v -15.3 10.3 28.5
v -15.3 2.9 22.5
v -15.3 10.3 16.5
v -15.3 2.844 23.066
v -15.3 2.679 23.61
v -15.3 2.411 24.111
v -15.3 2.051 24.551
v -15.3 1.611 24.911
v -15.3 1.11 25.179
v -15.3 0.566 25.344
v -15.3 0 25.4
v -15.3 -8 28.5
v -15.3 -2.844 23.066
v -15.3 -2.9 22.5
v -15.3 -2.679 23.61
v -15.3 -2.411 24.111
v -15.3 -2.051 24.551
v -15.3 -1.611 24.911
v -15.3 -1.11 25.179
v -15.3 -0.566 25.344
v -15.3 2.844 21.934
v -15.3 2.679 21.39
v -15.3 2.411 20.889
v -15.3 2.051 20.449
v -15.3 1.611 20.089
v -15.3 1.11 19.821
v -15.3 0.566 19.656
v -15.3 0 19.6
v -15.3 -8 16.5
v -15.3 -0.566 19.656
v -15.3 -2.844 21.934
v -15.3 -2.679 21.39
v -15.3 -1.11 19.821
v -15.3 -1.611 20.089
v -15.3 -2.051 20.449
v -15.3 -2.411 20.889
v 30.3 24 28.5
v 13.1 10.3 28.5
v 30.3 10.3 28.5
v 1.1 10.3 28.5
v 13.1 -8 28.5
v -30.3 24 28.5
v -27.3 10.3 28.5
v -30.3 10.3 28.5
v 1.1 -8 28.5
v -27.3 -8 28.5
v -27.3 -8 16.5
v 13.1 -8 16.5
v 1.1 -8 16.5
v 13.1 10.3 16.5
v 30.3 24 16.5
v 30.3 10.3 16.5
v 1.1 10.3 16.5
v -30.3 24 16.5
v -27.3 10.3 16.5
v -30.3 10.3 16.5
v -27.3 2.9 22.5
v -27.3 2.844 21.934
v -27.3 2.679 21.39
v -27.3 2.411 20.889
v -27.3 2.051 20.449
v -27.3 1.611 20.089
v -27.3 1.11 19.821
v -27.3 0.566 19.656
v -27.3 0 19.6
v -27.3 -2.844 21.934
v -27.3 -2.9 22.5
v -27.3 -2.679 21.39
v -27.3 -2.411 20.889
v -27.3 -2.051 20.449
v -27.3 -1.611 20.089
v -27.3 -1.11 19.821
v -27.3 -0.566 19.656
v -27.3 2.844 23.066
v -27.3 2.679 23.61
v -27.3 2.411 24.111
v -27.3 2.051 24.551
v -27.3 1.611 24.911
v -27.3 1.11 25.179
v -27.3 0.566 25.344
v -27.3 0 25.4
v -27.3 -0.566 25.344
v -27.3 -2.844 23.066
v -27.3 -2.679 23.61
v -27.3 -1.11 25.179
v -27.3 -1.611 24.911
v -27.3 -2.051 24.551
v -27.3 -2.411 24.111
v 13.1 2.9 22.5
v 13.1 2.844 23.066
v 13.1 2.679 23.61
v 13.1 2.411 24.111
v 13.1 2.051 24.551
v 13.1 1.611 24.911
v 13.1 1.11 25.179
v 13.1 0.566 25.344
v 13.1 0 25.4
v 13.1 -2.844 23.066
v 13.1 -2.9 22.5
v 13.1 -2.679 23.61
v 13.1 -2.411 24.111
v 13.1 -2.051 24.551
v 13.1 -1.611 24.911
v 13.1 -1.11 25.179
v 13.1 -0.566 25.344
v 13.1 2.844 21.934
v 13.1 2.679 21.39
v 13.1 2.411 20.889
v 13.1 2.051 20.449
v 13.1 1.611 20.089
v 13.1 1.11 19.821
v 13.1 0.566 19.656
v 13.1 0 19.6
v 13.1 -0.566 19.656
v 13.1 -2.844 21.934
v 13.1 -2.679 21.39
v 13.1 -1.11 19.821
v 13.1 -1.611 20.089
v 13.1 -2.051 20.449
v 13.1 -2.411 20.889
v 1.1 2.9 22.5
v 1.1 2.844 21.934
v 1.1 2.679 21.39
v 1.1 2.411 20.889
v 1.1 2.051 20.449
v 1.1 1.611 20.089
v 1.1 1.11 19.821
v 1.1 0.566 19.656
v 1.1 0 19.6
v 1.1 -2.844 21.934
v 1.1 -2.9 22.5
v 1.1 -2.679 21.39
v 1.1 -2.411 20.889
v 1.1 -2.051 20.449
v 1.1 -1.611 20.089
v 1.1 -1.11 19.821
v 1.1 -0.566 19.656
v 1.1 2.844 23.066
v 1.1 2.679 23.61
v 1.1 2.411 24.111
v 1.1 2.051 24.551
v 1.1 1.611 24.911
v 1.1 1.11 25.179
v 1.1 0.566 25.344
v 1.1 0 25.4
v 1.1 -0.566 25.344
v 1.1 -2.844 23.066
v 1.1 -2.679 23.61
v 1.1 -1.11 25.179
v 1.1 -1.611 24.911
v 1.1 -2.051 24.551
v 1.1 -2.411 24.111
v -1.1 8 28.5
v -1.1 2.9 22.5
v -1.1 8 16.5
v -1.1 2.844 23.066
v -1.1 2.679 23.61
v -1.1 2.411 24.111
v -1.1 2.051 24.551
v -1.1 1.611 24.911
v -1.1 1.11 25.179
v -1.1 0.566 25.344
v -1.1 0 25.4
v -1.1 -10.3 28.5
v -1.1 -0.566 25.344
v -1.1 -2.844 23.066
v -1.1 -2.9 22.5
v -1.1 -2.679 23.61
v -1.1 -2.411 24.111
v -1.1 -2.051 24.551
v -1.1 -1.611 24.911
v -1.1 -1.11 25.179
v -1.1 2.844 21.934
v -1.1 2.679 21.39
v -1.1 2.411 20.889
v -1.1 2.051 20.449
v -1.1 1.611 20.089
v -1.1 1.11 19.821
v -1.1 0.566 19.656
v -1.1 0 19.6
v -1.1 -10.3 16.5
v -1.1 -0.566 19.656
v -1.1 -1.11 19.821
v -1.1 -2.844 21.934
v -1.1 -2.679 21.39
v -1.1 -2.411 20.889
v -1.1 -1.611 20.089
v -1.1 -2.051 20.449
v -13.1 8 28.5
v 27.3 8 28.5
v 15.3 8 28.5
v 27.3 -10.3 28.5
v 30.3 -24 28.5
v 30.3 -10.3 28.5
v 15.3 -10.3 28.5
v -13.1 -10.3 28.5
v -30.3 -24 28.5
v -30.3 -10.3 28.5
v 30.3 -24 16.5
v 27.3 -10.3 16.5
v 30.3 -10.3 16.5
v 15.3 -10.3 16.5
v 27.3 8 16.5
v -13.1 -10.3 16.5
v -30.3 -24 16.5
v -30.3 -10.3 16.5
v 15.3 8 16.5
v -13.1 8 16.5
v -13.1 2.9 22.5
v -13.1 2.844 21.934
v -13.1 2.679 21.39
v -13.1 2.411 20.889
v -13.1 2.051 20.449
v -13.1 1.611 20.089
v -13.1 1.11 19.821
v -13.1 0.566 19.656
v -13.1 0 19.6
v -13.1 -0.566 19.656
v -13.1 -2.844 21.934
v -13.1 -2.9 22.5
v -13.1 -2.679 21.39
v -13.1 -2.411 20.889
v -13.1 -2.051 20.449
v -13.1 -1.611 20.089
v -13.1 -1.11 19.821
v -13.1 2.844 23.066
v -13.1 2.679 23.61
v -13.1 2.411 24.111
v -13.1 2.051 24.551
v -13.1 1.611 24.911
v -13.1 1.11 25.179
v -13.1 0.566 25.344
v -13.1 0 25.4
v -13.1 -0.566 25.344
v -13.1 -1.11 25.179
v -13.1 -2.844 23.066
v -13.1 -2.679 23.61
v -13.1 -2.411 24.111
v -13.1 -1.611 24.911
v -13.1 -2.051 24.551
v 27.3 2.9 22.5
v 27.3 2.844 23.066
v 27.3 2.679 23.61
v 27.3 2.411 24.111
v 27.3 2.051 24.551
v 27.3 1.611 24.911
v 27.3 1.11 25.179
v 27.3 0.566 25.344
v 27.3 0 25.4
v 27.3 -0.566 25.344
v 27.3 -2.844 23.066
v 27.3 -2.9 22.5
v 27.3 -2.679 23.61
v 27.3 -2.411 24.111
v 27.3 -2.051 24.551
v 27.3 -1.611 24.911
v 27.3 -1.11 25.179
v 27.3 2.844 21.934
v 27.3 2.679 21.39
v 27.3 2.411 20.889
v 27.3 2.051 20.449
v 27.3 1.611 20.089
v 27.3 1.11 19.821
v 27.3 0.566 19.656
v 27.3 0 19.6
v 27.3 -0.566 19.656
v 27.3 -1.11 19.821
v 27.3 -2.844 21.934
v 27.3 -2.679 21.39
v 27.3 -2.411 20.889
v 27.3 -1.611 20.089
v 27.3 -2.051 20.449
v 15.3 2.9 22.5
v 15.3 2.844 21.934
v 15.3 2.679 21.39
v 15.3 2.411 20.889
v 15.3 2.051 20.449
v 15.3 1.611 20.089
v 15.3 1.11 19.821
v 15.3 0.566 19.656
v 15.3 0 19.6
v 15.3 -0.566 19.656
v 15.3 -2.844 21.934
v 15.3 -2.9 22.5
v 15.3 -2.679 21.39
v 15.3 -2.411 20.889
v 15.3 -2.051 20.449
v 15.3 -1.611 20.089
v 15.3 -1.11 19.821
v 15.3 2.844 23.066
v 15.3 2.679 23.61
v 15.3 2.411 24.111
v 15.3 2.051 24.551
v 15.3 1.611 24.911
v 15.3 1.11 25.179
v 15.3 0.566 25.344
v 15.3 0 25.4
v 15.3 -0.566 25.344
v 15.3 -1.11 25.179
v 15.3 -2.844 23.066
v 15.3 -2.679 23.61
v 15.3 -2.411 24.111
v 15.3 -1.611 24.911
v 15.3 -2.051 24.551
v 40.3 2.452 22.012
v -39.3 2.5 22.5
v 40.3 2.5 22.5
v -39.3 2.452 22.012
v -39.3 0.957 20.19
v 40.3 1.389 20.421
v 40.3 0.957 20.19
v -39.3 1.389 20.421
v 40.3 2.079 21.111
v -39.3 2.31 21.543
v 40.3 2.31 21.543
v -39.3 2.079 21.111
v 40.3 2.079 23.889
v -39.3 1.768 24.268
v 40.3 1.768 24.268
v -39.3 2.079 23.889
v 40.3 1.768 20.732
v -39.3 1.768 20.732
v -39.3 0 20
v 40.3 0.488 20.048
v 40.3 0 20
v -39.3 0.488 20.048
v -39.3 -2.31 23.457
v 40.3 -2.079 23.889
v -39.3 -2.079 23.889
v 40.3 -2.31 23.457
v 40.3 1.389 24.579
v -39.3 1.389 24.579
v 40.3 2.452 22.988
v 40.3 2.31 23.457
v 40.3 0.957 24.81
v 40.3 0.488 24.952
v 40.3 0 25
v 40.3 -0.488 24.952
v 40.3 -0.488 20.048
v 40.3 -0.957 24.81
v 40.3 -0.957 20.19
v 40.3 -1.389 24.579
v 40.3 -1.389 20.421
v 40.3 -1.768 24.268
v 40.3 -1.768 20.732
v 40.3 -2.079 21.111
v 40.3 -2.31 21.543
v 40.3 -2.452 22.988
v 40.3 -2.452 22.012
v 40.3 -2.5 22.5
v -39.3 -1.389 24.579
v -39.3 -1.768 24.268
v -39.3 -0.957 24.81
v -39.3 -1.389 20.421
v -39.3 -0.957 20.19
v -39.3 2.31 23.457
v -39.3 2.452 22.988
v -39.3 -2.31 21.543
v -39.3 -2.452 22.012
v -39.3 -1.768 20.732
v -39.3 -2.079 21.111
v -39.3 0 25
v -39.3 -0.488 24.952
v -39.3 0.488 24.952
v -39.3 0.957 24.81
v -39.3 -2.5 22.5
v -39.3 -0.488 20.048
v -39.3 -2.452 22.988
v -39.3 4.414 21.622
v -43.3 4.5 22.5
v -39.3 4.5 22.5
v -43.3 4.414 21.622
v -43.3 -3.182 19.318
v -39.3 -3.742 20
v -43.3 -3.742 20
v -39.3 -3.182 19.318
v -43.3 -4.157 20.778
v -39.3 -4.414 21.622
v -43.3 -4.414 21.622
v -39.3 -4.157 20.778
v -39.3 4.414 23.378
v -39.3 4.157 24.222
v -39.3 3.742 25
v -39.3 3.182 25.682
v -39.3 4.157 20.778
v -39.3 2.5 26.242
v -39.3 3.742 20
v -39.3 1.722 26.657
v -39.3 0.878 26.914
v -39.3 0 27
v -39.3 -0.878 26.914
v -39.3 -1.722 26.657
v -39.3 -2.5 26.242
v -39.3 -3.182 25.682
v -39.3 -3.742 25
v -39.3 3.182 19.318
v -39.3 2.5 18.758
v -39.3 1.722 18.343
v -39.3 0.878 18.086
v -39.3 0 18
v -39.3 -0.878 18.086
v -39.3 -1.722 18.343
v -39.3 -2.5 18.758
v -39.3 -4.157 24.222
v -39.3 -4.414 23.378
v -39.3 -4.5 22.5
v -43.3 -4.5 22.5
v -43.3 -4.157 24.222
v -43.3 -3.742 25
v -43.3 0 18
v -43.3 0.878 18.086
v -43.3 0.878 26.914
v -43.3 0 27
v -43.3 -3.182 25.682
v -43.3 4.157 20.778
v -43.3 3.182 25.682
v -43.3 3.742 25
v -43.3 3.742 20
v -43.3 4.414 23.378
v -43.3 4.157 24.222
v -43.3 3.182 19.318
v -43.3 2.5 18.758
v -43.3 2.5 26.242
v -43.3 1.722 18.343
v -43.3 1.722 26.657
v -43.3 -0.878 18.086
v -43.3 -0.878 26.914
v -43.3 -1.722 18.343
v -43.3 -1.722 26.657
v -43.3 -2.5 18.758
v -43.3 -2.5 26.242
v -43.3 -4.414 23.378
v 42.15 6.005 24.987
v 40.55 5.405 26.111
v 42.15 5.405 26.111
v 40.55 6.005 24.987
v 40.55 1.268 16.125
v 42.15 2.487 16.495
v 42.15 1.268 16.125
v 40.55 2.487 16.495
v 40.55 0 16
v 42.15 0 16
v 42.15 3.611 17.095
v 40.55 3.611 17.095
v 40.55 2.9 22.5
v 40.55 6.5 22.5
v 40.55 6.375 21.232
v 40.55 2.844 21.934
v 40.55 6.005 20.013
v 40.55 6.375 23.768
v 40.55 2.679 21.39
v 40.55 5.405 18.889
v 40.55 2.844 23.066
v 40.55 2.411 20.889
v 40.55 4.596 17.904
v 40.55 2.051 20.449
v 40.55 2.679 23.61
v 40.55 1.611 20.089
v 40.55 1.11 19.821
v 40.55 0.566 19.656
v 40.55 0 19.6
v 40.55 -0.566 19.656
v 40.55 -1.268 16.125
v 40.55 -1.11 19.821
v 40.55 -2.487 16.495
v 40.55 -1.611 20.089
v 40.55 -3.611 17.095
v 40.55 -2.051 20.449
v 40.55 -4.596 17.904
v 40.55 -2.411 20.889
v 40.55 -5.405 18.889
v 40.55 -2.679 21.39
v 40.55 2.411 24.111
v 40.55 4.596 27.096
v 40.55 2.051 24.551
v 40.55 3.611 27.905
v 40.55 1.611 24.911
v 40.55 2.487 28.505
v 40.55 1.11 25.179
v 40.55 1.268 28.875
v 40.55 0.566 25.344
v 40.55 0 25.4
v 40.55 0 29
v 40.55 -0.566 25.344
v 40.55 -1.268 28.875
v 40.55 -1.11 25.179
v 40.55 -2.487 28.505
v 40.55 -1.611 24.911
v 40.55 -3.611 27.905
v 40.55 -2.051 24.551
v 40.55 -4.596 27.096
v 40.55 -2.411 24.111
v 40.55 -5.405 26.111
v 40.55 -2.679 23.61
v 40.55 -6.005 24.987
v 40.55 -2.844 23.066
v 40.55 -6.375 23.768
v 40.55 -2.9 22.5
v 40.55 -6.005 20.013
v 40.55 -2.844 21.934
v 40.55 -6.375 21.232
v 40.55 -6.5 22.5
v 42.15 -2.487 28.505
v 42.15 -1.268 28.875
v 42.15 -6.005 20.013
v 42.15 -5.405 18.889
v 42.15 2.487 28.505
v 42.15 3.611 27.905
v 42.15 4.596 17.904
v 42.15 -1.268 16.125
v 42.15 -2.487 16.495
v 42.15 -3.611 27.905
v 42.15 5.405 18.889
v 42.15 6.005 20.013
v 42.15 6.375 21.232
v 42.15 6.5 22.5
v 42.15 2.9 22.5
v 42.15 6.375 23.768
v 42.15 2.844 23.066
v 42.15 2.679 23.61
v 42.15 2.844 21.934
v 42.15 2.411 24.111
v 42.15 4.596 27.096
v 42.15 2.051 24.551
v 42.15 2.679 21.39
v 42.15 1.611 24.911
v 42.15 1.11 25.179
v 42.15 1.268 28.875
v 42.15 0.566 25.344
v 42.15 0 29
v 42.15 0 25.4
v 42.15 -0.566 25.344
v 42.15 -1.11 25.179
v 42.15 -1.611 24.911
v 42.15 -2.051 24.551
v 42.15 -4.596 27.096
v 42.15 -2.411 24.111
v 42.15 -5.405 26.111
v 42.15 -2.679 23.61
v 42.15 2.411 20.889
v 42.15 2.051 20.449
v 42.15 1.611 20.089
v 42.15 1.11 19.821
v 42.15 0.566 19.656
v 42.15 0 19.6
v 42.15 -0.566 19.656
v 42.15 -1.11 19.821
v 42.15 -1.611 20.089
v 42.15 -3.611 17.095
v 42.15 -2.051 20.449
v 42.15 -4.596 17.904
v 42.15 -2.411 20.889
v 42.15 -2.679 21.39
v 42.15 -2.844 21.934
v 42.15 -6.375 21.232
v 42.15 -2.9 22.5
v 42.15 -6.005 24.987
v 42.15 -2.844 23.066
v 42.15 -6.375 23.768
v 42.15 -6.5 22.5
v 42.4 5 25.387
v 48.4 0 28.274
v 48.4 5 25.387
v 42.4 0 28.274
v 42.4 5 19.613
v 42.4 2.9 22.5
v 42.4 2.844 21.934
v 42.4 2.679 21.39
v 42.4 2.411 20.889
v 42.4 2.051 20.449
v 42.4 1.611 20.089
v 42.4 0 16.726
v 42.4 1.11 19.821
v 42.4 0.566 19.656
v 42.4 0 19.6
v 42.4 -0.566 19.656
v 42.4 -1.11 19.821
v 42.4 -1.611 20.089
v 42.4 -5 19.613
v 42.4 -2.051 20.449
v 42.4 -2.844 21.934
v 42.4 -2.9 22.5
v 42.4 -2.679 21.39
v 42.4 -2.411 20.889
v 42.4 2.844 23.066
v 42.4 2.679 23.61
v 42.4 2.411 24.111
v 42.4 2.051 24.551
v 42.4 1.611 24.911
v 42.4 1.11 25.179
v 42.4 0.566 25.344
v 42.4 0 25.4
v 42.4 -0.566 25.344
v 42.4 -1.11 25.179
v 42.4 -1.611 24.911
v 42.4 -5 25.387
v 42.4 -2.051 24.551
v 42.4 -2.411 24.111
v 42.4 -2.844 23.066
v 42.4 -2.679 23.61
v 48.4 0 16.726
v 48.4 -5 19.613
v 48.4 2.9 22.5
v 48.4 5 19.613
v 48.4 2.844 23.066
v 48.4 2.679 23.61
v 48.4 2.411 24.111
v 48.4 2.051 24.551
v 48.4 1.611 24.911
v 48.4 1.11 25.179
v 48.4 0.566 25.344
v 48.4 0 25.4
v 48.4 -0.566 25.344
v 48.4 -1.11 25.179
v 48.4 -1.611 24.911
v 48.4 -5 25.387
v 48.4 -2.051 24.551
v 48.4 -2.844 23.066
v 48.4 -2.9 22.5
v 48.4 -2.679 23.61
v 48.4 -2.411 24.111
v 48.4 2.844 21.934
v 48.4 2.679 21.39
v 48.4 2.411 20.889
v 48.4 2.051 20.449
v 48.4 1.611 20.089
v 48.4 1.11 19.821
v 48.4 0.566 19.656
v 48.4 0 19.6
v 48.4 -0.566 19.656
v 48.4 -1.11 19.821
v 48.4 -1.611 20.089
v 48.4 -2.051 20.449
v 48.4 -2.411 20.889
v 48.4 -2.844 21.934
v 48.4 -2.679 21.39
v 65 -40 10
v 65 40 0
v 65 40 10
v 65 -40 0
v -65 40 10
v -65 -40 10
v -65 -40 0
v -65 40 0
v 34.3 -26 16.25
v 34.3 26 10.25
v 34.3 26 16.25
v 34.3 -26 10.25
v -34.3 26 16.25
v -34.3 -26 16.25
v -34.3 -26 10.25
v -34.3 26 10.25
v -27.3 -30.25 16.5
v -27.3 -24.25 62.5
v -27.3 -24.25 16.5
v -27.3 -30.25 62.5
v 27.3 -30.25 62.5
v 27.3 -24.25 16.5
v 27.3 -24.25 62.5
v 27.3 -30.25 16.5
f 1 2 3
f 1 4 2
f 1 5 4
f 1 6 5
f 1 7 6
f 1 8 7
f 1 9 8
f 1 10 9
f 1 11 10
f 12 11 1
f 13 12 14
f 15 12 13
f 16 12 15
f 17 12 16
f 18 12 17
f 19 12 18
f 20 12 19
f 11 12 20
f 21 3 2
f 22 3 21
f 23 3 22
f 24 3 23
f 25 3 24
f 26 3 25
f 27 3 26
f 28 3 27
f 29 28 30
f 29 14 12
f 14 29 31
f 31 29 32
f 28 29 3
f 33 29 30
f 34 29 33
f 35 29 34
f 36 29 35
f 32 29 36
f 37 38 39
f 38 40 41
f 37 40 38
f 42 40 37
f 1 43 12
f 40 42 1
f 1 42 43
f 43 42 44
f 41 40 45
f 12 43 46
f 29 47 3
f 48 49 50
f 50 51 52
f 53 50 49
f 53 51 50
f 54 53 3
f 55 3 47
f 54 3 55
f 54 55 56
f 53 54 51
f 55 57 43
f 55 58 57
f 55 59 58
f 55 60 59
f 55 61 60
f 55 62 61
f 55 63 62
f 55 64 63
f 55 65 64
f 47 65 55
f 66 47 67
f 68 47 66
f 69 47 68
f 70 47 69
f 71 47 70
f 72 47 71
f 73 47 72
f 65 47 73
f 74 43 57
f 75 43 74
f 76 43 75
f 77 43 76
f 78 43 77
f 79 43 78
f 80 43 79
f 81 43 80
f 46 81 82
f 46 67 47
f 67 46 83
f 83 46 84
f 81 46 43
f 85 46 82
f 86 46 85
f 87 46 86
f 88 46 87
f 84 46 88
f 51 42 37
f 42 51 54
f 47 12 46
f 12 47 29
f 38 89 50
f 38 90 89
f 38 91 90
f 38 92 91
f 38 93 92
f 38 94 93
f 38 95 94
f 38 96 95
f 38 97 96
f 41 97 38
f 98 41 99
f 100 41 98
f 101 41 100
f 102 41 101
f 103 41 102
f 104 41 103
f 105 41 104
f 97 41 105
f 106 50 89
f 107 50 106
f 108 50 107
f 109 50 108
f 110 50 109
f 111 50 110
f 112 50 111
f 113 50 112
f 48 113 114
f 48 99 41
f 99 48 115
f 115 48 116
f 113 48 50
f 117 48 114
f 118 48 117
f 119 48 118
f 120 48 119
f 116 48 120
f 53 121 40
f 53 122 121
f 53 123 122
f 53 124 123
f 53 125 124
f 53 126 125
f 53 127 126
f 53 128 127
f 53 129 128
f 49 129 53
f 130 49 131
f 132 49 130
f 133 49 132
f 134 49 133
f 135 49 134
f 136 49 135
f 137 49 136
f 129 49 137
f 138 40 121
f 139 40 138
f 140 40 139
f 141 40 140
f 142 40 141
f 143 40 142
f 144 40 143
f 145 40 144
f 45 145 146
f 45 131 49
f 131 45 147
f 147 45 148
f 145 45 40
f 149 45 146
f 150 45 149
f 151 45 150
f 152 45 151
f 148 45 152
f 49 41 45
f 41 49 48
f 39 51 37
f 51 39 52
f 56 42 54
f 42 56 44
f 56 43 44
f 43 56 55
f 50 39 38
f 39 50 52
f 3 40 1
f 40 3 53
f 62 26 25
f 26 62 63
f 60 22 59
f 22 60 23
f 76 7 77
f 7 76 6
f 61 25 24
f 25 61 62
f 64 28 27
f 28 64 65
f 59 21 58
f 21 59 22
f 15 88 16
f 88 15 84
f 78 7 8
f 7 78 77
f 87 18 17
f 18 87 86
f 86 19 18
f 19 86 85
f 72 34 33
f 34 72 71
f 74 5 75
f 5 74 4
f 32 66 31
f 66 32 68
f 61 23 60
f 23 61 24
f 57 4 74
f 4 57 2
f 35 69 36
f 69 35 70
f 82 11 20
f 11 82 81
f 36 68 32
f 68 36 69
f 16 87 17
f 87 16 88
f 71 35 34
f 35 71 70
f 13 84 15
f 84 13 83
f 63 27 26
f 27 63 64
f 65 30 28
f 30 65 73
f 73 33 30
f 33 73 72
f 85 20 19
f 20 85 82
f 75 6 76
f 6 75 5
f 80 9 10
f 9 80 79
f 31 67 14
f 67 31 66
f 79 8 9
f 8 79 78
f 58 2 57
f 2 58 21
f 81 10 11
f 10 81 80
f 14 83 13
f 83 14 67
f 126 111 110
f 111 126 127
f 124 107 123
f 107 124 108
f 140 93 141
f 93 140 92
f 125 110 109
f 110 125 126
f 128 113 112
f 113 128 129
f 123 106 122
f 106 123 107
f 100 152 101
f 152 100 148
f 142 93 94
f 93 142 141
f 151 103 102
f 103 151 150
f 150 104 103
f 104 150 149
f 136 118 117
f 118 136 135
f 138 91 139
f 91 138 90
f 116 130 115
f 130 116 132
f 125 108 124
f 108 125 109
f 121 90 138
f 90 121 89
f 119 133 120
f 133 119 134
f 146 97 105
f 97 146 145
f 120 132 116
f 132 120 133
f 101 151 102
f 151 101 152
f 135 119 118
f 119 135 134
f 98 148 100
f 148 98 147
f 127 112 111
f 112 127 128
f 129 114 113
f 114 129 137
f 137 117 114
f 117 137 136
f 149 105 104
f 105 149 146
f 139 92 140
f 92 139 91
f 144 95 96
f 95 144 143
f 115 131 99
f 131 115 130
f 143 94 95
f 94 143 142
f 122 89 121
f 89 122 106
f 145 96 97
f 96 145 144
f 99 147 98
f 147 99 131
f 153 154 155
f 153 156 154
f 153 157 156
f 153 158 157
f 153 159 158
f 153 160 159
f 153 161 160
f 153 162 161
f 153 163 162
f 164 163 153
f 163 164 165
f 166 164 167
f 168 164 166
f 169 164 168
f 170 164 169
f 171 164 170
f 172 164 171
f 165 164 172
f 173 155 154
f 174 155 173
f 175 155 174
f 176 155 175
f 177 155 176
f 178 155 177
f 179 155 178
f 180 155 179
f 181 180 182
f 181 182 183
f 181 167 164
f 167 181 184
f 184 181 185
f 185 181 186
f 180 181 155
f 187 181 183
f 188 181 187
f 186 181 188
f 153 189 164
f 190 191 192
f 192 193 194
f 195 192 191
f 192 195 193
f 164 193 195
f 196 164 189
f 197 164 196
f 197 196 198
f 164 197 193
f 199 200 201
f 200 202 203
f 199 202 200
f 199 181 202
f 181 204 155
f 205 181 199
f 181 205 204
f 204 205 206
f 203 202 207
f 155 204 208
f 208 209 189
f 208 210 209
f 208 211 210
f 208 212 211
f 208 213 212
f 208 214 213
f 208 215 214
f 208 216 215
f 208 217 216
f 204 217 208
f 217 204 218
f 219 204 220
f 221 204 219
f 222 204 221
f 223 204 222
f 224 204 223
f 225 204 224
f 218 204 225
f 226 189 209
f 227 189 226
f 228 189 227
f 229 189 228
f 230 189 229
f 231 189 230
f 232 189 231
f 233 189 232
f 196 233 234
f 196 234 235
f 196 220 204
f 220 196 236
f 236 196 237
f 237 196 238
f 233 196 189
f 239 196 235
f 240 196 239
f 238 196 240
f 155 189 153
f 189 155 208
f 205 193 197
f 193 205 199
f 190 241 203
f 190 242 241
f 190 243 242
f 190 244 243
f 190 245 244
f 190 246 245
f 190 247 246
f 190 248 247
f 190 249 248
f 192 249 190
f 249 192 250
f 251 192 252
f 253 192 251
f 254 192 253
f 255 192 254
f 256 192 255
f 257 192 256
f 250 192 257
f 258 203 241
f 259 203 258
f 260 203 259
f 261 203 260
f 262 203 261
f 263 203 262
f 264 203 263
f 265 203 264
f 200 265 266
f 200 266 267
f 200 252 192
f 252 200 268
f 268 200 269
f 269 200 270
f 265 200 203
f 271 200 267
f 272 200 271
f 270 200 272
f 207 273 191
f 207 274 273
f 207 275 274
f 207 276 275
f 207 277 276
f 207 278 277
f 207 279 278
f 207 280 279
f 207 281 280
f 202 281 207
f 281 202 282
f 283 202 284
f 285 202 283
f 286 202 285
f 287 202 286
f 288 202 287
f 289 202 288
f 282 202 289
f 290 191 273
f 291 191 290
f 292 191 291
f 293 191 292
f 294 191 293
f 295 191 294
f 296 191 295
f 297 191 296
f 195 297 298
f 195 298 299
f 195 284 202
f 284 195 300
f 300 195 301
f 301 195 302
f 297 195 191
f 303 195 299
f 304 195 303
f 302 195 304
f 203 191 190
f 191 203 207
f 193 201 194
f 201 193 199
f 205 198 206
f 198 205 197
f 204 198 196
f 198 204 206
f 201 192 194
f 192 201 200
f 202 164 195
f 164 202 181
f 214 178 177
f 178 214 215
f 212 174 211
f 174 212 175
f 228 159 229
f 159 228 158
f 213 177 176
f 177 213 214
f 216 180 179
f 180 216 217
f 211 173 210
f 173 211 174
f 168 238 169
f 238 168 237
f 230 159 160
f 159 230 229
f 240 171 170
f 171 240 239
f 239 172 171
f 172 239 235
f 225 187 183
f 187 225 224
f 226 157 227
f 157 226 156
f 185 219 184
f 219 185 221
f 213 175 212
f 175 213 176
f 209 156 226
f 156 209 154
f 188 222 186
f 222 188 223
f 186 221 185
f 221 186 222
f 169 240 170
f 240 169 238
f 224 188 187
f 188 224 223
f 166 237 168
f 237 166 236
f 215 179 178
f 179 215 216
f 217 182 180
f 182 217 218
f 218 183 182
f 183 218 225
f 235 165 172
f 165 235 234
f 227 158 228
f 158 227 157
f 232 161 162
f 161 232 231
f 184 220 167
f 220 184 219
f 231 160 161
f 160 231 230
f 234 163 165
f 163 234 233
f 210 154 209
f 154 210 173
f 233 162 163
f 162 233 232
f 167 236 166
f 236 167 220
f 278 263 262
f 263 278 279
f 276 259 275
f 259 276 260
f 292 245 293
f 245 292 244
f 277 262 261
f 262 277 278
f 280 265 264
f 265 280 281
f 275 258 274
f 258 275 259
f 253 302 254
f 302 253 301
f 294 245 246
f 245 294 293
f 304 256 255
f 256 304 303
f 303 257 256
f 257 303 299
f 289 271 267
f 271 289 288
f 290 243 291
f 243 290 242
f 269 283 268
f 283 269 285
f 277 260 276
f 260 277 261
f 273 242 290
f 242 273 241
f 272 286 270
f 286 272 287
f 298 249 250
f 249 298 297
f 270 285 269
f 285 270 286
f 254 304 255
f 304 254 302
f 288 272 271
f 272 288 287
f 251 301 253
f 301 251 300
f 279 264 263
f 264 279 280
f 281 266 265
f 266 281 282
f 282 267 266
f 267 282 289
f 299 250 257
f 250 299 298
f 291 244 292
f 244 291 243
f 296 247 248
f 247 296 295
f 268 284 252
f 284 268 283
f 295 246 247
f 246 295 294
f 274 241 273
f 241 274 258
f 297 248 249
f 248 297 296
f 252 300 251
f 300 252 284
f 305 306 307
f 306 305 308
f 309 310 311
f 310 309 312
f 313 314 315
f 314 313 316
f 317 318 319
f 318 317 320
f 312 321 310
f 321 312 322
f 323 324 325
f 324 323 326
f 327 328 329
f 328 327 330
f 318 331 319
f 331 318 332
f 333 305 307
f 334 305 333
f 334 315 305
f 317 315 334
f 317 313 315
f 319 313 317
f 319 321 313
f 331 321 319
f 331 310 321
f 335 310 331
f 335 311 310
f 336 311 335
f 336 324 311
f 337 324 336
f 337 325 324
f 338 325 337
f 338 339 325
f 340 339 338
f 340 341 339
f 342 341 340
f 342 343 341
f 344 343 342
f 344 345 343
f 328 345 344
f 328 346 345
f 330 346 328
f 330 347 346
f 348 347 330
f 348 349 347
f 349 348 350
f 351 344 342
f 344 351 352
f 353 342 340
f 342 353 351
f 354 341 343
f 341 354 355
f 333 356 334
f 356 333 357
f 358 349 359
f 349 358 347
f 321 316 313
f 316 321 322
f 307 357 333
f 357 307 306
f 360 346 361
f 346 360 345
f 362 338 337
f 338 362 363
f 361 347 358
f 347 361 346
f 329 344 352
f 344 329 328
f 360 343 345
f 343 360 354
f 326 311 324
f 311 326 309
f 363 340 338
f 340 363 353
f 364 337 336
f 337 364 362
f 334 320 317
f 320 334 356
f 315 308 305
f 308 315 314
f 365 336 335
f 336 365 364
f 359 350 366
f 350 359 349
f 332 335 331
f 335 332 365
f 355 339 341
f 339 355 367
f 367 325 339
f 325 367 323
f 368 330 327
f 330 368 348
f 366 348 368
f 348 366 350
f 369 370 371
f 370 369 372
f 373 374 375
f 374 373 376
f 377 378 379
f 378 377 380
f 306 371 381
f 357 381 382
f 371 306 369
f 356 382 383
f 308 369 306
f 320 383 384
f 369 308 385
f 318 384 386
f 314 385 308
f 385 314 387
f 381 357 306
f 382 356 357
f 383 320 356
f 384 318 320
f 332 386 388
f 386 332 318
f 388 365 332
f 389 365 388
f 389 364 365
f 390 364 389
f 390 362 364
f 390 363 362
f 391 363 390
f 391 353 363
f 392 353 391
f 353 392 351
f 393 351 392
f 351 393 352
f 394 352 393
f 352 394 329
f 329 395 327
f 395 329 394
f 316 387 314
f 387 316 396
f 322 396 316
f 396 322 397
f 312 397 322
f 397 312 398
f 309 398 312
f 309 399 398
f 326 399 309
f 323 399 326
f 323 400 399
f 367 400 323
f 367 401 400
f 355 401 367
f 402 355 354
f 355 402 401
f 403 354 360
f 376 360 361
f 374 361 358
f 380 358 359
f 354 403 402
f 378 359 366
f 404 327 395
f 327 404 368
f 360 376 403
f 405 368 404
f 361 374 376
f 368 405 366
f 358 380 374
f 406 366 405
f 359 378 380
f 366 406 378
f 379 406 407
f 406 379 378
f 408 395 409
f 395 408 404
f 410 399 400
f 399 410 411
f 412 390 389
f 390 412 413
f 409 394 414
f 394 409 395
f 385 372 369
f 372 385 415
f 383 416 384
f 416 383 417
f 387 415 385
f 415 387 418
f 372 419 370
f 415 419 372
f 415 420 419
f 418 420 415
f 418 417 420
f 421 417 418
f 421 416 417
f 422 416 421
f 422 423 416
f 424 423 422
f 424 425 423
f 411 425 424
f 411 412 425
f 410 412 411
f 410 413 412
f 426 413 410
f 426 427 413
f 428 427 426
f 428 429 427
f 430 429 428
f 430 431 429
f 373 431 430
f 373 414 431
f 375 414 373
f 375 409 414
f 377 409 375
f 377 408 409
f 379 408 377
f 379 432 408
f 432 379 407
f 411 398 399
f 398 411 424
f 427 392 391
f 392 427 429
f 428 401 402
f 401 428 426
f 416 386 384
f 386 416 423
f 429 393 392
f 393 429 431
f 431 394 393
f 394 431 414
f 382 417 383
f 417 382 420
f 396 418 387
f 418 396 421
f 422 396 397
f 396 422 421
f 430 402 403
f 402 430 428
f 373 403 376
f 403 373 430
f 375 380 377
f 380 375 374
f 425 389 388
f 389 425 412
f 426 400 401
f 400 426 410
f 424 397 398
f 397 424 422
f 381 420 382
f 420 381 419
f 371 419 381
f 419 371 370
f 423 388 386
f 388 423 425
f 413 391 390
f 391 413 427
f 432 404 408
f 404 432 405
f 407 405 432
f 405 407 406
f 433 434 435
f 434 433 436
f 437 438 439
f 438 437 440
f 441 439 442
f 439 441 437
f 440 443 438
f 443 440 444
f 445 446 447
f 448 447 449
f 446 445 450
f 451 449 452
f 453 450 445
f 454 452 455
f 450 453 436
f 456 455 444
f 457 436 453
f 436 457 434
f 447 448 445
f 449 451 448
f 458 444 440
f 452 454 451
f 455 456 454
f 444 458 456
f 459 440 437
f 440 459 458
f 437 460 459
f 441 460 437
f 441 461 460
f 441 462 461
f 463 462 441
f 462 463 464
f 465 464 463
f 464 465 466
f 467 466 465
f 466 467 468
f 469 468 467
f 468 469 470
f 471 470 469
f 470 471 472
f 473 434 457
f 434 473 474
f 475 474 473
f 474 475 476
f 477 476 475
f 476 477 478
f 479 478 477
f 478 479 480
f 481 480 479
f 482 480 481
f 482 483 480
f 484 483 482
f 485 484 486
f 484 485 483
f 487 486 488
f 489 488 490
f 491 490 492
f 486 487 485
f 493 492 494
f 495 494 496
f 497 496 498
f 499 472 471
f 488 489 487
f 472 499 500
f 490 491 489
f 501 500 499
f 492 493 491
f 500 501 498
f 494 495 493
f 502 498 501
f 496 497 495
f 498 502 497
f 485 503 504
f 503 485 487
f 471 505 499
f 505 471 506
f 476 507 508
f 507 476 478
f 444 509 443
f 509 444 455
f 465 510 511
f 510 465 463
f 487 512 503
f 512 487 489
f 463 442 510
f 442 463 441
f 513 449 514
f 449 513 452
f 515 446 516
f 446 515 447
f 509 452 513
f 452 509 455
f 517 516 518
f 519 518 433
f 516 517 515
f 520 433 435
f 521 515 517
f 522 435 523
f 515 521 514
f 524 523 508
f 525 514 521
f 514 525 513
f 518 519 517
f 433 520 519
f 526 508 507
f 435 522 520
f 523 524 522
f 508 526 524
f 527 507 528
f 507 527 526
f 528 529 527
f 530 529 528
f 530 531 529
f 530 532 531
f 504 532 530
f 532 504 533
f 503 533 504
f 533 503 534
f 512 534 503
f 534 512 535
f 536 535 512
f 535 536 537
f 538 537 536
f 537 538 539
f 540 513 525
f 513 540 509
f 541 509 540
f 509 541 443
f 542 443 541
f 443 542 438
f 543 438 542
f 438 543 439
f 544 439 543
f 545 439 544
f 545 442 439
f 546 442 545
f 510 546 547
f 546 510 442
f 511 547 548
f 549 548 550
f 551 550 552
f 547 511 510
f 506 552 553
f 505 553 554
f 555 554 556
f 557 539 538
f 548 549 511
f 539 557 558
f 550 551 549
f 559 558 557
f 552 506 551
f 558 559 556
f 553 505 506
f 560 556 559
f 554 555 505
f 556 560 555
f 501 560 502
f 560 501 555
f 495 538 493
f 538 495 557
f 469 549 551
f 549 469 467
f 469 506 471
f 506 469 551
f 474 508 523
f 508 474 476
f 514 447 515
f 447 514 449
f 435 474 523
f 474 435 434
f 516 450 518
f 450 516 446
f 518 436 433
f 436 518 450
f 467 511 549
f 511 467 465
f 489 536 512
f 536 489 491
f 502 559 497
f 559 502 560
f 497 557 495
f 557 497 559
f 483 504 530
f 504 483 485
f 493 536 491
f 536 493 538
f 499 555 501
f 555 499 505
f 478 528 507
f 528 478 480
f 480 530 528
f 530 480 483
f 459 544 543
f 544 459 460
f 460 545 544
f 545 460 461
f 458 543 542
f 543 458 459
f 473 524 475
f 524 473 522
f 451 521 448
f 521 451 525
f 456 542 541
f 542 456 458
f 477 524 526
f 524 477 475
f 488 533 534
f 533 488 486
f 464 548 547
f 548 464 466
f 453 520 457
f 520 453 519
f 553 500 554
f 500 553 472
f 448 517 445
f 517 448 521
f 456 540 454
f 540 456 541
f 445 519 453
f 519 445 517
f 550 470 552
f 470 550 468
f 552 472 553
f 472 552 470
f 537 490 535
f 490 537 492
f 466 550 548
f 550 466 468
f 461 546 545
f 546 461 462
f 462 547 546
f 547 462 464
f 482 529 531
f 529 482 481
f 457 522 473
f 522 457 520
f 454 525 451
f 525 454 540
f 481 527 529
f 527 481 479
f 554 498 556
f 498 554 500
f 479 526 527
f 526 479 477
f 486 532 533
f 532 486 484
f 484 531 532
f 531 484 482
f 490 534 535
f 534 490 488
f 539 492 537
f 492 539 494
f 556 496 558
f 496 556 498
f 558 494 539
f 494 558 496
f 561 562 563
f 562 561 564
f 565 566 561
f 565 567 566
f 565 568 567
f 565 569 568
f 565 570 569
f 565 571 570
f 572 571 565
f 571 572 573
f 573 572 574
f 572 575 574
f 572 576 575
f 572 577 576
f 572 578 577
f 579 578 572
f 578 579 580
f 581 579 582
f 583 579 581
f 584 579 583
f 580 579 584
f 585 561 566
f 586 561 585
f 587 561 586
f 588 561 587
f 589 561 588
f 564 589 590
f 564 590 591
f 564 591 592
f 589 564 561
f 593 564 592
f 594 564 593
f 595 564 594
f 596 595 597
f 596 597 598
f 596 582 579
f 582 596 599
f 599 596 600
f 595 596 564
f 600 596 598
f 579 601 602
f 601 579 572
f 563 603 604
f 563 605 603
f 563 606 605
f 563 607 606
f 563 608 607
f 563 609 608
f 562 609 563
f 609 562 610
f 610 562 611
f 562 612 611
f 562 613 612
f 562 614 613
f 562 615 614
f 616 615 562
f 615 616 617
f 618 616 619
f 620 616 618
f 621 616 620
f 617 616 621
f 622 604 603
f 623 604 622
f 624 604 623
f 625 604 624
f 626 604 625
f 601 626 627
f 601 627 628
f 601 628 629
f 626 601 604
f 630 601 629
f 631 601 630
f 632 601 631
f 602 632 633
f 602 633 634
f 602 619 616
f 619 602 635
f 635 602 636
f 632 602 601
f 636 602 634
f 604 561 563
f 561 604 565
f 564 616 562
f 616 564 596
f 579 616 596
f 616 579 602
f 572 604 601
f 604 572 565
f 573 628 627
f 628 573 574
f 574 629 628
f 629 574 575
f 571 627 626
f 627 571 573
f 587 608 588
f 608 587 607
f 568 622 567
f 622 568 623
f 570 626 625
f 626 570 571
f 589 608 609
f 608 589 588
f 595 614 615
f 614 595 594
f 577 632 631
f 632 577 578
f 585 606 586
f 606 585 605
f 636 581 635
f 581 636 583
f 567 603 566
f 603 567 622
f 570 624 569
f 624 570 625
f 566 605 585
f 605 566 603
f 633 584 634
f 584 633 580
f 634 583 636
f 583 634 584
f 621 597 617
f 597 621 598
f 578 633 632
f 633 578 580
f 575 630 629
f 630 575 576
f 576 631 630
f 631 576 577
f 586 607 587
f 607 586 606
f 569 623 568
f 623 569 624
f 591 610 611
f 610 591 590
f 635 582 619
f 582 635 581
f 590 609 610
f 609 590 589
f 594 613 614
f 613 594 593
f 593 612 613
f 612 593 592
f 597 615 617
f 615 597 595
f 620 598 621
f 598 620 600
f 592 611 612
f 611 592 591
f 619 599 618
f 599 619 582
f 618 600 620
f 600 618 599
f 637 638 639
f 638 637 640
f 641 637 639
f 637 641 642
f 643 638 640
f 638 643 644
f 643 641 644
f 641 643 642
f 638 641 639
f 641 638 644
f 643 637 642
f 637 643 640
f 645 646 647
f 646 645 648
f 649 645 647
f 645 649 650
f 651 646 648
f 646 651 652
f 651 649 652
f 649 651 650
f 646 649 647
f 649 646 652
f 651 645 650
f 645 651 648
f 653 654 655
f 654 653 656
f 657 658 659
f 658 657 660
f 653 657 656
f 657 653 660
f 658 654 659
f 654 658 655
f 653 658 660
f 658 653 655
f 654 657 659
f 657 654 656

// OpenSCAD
$fn = 32;

// ------------------------------------------------------------------------
// Comb hinge with flap: leaf 60.6 x 24 mm, pin d5, flap 46 mm
// Every part is its own module, assembly() places every instance.
// ------------------------------------------------------------------------

// --- part 1 ---
module hinge_bed() {
  difference() {
    translate([-65, -40, 0]) cube([130, 80, 10]);
  }
}

// --- part 2 ---
module hinge_riser() {
  difference() {
    translate([-34.3, -26, 0]) cube([68.6, 52, 6]);
  }
}

// --- part 3 ---
module hinge_leaf_a() {
  difference() {
    union() {
      translate([-27.3, -8, -6]) cube([12, 32, 12]);
      translate([1.1, -8, -6]) cube([12, 32, 12]);
      translate([-30.3, 10.3, -6]) cube([60.6, 13.7, 12]);
    }
    translate([-21.3, 0, 0]) rotate([0, 90, 0]) cylinder(h = 14, d = 5.8, center = true);
    translate([7.1, 0, 0]) rotate([0, 90, 0]) cylinder(h = 14, d = 5.8, center = true);
  }
}

// --- part 4 ---
module hinge_leaf_b() {
  difference() {
    union() {
      translate([-13.1, -24, -6]) cube([12, 32, 12]);
      translate([15.3, -24, -6]) cube([12, 32, 12]);
      translate([-30.3, -24, -6]) cube([60.6, 13.7, 12]);
    }
    translate([-7.1, 0, 0]) rotate([0, 90, 0]) cylinder(h = 14, d = 5.8, center = true);
    translate([21.3, 0, 0]) rotate([0, 90, 0]) cylinder(h = 14, d = 5.8, center = true);
  }
}

// --- part 5 ---
module hinge_flap() {
  difference() {
    translate([-27.3, -23, 0]) cube([54.6, 46, 6]);
  }
}

// --- part 6 ---
module hinge_pin() {
  rotate([0, 90, 0]) cylinder(h = 80.6, d = 5, center = true);
  translate([-43.3, 0, 0]) rotate([0, 90, 0]) cylinder(h = 4, d = 9);
}

// --- part 7 ---
module pin_washer() {
  difference() {
      translate([0, 0, 0]) cylinder(h = 1.6, d = 13);
      translate([0, 0, -1]) cylinder(h = 3.6, d = 5.8);
    }
}

// --- part 8 ---
module pin_nut() {
  difference() {
    linear_extrude(height = 6) polygon(points = [[5.774, 0], [2.887, 5], [-2.887, 5], [-5.774, 0], [-2.887, -5], [2.887, -5]]);
    translate([0, 0, -1]) cylinder(h = 8, d = 5.8);
  }
}

// --- assembly ---
module assembly() {
  color([0.80, 0.24, 0.20]) translate([0, 0, 0]) rotate([0, 0, 0]) hinge_bed();
  color([0.20, 0.45, 0.75]) translate([0, 0, 10.25]) rotate([0, 0, 0]) hinge_riser();
  color([0.25, 0.62, 0.32]) translate([0, 0, 22.5]) rotate([0, 0, 0]) hinge_leaf_a();
  color([0.92, 0.70, 0.18]) translate([0, 0, 22.5]) rotate([0, 0, 0]) hinge_leaf_b();
  color([0.58, 0.35, 0.70]) translate([0, -24.25, 39.5]) rotate([90, 0, 0]) hinge_flap();
  color([0.16, 0.66, 0.66]) translate([0, 0, 22.5]) rotate([0, 0, 0]) hinge_pin();
  color([0.85, 0.48, 0.18]) translate([40.55, 0, 22.5]) rotate([0, 90, 0]) pin_washer();
  color([0.55, 0.60, 0.65]) translate([42.4, 0, 22.5]) rotate([0, 90, 0]) pin_nut();
}

assembly();
